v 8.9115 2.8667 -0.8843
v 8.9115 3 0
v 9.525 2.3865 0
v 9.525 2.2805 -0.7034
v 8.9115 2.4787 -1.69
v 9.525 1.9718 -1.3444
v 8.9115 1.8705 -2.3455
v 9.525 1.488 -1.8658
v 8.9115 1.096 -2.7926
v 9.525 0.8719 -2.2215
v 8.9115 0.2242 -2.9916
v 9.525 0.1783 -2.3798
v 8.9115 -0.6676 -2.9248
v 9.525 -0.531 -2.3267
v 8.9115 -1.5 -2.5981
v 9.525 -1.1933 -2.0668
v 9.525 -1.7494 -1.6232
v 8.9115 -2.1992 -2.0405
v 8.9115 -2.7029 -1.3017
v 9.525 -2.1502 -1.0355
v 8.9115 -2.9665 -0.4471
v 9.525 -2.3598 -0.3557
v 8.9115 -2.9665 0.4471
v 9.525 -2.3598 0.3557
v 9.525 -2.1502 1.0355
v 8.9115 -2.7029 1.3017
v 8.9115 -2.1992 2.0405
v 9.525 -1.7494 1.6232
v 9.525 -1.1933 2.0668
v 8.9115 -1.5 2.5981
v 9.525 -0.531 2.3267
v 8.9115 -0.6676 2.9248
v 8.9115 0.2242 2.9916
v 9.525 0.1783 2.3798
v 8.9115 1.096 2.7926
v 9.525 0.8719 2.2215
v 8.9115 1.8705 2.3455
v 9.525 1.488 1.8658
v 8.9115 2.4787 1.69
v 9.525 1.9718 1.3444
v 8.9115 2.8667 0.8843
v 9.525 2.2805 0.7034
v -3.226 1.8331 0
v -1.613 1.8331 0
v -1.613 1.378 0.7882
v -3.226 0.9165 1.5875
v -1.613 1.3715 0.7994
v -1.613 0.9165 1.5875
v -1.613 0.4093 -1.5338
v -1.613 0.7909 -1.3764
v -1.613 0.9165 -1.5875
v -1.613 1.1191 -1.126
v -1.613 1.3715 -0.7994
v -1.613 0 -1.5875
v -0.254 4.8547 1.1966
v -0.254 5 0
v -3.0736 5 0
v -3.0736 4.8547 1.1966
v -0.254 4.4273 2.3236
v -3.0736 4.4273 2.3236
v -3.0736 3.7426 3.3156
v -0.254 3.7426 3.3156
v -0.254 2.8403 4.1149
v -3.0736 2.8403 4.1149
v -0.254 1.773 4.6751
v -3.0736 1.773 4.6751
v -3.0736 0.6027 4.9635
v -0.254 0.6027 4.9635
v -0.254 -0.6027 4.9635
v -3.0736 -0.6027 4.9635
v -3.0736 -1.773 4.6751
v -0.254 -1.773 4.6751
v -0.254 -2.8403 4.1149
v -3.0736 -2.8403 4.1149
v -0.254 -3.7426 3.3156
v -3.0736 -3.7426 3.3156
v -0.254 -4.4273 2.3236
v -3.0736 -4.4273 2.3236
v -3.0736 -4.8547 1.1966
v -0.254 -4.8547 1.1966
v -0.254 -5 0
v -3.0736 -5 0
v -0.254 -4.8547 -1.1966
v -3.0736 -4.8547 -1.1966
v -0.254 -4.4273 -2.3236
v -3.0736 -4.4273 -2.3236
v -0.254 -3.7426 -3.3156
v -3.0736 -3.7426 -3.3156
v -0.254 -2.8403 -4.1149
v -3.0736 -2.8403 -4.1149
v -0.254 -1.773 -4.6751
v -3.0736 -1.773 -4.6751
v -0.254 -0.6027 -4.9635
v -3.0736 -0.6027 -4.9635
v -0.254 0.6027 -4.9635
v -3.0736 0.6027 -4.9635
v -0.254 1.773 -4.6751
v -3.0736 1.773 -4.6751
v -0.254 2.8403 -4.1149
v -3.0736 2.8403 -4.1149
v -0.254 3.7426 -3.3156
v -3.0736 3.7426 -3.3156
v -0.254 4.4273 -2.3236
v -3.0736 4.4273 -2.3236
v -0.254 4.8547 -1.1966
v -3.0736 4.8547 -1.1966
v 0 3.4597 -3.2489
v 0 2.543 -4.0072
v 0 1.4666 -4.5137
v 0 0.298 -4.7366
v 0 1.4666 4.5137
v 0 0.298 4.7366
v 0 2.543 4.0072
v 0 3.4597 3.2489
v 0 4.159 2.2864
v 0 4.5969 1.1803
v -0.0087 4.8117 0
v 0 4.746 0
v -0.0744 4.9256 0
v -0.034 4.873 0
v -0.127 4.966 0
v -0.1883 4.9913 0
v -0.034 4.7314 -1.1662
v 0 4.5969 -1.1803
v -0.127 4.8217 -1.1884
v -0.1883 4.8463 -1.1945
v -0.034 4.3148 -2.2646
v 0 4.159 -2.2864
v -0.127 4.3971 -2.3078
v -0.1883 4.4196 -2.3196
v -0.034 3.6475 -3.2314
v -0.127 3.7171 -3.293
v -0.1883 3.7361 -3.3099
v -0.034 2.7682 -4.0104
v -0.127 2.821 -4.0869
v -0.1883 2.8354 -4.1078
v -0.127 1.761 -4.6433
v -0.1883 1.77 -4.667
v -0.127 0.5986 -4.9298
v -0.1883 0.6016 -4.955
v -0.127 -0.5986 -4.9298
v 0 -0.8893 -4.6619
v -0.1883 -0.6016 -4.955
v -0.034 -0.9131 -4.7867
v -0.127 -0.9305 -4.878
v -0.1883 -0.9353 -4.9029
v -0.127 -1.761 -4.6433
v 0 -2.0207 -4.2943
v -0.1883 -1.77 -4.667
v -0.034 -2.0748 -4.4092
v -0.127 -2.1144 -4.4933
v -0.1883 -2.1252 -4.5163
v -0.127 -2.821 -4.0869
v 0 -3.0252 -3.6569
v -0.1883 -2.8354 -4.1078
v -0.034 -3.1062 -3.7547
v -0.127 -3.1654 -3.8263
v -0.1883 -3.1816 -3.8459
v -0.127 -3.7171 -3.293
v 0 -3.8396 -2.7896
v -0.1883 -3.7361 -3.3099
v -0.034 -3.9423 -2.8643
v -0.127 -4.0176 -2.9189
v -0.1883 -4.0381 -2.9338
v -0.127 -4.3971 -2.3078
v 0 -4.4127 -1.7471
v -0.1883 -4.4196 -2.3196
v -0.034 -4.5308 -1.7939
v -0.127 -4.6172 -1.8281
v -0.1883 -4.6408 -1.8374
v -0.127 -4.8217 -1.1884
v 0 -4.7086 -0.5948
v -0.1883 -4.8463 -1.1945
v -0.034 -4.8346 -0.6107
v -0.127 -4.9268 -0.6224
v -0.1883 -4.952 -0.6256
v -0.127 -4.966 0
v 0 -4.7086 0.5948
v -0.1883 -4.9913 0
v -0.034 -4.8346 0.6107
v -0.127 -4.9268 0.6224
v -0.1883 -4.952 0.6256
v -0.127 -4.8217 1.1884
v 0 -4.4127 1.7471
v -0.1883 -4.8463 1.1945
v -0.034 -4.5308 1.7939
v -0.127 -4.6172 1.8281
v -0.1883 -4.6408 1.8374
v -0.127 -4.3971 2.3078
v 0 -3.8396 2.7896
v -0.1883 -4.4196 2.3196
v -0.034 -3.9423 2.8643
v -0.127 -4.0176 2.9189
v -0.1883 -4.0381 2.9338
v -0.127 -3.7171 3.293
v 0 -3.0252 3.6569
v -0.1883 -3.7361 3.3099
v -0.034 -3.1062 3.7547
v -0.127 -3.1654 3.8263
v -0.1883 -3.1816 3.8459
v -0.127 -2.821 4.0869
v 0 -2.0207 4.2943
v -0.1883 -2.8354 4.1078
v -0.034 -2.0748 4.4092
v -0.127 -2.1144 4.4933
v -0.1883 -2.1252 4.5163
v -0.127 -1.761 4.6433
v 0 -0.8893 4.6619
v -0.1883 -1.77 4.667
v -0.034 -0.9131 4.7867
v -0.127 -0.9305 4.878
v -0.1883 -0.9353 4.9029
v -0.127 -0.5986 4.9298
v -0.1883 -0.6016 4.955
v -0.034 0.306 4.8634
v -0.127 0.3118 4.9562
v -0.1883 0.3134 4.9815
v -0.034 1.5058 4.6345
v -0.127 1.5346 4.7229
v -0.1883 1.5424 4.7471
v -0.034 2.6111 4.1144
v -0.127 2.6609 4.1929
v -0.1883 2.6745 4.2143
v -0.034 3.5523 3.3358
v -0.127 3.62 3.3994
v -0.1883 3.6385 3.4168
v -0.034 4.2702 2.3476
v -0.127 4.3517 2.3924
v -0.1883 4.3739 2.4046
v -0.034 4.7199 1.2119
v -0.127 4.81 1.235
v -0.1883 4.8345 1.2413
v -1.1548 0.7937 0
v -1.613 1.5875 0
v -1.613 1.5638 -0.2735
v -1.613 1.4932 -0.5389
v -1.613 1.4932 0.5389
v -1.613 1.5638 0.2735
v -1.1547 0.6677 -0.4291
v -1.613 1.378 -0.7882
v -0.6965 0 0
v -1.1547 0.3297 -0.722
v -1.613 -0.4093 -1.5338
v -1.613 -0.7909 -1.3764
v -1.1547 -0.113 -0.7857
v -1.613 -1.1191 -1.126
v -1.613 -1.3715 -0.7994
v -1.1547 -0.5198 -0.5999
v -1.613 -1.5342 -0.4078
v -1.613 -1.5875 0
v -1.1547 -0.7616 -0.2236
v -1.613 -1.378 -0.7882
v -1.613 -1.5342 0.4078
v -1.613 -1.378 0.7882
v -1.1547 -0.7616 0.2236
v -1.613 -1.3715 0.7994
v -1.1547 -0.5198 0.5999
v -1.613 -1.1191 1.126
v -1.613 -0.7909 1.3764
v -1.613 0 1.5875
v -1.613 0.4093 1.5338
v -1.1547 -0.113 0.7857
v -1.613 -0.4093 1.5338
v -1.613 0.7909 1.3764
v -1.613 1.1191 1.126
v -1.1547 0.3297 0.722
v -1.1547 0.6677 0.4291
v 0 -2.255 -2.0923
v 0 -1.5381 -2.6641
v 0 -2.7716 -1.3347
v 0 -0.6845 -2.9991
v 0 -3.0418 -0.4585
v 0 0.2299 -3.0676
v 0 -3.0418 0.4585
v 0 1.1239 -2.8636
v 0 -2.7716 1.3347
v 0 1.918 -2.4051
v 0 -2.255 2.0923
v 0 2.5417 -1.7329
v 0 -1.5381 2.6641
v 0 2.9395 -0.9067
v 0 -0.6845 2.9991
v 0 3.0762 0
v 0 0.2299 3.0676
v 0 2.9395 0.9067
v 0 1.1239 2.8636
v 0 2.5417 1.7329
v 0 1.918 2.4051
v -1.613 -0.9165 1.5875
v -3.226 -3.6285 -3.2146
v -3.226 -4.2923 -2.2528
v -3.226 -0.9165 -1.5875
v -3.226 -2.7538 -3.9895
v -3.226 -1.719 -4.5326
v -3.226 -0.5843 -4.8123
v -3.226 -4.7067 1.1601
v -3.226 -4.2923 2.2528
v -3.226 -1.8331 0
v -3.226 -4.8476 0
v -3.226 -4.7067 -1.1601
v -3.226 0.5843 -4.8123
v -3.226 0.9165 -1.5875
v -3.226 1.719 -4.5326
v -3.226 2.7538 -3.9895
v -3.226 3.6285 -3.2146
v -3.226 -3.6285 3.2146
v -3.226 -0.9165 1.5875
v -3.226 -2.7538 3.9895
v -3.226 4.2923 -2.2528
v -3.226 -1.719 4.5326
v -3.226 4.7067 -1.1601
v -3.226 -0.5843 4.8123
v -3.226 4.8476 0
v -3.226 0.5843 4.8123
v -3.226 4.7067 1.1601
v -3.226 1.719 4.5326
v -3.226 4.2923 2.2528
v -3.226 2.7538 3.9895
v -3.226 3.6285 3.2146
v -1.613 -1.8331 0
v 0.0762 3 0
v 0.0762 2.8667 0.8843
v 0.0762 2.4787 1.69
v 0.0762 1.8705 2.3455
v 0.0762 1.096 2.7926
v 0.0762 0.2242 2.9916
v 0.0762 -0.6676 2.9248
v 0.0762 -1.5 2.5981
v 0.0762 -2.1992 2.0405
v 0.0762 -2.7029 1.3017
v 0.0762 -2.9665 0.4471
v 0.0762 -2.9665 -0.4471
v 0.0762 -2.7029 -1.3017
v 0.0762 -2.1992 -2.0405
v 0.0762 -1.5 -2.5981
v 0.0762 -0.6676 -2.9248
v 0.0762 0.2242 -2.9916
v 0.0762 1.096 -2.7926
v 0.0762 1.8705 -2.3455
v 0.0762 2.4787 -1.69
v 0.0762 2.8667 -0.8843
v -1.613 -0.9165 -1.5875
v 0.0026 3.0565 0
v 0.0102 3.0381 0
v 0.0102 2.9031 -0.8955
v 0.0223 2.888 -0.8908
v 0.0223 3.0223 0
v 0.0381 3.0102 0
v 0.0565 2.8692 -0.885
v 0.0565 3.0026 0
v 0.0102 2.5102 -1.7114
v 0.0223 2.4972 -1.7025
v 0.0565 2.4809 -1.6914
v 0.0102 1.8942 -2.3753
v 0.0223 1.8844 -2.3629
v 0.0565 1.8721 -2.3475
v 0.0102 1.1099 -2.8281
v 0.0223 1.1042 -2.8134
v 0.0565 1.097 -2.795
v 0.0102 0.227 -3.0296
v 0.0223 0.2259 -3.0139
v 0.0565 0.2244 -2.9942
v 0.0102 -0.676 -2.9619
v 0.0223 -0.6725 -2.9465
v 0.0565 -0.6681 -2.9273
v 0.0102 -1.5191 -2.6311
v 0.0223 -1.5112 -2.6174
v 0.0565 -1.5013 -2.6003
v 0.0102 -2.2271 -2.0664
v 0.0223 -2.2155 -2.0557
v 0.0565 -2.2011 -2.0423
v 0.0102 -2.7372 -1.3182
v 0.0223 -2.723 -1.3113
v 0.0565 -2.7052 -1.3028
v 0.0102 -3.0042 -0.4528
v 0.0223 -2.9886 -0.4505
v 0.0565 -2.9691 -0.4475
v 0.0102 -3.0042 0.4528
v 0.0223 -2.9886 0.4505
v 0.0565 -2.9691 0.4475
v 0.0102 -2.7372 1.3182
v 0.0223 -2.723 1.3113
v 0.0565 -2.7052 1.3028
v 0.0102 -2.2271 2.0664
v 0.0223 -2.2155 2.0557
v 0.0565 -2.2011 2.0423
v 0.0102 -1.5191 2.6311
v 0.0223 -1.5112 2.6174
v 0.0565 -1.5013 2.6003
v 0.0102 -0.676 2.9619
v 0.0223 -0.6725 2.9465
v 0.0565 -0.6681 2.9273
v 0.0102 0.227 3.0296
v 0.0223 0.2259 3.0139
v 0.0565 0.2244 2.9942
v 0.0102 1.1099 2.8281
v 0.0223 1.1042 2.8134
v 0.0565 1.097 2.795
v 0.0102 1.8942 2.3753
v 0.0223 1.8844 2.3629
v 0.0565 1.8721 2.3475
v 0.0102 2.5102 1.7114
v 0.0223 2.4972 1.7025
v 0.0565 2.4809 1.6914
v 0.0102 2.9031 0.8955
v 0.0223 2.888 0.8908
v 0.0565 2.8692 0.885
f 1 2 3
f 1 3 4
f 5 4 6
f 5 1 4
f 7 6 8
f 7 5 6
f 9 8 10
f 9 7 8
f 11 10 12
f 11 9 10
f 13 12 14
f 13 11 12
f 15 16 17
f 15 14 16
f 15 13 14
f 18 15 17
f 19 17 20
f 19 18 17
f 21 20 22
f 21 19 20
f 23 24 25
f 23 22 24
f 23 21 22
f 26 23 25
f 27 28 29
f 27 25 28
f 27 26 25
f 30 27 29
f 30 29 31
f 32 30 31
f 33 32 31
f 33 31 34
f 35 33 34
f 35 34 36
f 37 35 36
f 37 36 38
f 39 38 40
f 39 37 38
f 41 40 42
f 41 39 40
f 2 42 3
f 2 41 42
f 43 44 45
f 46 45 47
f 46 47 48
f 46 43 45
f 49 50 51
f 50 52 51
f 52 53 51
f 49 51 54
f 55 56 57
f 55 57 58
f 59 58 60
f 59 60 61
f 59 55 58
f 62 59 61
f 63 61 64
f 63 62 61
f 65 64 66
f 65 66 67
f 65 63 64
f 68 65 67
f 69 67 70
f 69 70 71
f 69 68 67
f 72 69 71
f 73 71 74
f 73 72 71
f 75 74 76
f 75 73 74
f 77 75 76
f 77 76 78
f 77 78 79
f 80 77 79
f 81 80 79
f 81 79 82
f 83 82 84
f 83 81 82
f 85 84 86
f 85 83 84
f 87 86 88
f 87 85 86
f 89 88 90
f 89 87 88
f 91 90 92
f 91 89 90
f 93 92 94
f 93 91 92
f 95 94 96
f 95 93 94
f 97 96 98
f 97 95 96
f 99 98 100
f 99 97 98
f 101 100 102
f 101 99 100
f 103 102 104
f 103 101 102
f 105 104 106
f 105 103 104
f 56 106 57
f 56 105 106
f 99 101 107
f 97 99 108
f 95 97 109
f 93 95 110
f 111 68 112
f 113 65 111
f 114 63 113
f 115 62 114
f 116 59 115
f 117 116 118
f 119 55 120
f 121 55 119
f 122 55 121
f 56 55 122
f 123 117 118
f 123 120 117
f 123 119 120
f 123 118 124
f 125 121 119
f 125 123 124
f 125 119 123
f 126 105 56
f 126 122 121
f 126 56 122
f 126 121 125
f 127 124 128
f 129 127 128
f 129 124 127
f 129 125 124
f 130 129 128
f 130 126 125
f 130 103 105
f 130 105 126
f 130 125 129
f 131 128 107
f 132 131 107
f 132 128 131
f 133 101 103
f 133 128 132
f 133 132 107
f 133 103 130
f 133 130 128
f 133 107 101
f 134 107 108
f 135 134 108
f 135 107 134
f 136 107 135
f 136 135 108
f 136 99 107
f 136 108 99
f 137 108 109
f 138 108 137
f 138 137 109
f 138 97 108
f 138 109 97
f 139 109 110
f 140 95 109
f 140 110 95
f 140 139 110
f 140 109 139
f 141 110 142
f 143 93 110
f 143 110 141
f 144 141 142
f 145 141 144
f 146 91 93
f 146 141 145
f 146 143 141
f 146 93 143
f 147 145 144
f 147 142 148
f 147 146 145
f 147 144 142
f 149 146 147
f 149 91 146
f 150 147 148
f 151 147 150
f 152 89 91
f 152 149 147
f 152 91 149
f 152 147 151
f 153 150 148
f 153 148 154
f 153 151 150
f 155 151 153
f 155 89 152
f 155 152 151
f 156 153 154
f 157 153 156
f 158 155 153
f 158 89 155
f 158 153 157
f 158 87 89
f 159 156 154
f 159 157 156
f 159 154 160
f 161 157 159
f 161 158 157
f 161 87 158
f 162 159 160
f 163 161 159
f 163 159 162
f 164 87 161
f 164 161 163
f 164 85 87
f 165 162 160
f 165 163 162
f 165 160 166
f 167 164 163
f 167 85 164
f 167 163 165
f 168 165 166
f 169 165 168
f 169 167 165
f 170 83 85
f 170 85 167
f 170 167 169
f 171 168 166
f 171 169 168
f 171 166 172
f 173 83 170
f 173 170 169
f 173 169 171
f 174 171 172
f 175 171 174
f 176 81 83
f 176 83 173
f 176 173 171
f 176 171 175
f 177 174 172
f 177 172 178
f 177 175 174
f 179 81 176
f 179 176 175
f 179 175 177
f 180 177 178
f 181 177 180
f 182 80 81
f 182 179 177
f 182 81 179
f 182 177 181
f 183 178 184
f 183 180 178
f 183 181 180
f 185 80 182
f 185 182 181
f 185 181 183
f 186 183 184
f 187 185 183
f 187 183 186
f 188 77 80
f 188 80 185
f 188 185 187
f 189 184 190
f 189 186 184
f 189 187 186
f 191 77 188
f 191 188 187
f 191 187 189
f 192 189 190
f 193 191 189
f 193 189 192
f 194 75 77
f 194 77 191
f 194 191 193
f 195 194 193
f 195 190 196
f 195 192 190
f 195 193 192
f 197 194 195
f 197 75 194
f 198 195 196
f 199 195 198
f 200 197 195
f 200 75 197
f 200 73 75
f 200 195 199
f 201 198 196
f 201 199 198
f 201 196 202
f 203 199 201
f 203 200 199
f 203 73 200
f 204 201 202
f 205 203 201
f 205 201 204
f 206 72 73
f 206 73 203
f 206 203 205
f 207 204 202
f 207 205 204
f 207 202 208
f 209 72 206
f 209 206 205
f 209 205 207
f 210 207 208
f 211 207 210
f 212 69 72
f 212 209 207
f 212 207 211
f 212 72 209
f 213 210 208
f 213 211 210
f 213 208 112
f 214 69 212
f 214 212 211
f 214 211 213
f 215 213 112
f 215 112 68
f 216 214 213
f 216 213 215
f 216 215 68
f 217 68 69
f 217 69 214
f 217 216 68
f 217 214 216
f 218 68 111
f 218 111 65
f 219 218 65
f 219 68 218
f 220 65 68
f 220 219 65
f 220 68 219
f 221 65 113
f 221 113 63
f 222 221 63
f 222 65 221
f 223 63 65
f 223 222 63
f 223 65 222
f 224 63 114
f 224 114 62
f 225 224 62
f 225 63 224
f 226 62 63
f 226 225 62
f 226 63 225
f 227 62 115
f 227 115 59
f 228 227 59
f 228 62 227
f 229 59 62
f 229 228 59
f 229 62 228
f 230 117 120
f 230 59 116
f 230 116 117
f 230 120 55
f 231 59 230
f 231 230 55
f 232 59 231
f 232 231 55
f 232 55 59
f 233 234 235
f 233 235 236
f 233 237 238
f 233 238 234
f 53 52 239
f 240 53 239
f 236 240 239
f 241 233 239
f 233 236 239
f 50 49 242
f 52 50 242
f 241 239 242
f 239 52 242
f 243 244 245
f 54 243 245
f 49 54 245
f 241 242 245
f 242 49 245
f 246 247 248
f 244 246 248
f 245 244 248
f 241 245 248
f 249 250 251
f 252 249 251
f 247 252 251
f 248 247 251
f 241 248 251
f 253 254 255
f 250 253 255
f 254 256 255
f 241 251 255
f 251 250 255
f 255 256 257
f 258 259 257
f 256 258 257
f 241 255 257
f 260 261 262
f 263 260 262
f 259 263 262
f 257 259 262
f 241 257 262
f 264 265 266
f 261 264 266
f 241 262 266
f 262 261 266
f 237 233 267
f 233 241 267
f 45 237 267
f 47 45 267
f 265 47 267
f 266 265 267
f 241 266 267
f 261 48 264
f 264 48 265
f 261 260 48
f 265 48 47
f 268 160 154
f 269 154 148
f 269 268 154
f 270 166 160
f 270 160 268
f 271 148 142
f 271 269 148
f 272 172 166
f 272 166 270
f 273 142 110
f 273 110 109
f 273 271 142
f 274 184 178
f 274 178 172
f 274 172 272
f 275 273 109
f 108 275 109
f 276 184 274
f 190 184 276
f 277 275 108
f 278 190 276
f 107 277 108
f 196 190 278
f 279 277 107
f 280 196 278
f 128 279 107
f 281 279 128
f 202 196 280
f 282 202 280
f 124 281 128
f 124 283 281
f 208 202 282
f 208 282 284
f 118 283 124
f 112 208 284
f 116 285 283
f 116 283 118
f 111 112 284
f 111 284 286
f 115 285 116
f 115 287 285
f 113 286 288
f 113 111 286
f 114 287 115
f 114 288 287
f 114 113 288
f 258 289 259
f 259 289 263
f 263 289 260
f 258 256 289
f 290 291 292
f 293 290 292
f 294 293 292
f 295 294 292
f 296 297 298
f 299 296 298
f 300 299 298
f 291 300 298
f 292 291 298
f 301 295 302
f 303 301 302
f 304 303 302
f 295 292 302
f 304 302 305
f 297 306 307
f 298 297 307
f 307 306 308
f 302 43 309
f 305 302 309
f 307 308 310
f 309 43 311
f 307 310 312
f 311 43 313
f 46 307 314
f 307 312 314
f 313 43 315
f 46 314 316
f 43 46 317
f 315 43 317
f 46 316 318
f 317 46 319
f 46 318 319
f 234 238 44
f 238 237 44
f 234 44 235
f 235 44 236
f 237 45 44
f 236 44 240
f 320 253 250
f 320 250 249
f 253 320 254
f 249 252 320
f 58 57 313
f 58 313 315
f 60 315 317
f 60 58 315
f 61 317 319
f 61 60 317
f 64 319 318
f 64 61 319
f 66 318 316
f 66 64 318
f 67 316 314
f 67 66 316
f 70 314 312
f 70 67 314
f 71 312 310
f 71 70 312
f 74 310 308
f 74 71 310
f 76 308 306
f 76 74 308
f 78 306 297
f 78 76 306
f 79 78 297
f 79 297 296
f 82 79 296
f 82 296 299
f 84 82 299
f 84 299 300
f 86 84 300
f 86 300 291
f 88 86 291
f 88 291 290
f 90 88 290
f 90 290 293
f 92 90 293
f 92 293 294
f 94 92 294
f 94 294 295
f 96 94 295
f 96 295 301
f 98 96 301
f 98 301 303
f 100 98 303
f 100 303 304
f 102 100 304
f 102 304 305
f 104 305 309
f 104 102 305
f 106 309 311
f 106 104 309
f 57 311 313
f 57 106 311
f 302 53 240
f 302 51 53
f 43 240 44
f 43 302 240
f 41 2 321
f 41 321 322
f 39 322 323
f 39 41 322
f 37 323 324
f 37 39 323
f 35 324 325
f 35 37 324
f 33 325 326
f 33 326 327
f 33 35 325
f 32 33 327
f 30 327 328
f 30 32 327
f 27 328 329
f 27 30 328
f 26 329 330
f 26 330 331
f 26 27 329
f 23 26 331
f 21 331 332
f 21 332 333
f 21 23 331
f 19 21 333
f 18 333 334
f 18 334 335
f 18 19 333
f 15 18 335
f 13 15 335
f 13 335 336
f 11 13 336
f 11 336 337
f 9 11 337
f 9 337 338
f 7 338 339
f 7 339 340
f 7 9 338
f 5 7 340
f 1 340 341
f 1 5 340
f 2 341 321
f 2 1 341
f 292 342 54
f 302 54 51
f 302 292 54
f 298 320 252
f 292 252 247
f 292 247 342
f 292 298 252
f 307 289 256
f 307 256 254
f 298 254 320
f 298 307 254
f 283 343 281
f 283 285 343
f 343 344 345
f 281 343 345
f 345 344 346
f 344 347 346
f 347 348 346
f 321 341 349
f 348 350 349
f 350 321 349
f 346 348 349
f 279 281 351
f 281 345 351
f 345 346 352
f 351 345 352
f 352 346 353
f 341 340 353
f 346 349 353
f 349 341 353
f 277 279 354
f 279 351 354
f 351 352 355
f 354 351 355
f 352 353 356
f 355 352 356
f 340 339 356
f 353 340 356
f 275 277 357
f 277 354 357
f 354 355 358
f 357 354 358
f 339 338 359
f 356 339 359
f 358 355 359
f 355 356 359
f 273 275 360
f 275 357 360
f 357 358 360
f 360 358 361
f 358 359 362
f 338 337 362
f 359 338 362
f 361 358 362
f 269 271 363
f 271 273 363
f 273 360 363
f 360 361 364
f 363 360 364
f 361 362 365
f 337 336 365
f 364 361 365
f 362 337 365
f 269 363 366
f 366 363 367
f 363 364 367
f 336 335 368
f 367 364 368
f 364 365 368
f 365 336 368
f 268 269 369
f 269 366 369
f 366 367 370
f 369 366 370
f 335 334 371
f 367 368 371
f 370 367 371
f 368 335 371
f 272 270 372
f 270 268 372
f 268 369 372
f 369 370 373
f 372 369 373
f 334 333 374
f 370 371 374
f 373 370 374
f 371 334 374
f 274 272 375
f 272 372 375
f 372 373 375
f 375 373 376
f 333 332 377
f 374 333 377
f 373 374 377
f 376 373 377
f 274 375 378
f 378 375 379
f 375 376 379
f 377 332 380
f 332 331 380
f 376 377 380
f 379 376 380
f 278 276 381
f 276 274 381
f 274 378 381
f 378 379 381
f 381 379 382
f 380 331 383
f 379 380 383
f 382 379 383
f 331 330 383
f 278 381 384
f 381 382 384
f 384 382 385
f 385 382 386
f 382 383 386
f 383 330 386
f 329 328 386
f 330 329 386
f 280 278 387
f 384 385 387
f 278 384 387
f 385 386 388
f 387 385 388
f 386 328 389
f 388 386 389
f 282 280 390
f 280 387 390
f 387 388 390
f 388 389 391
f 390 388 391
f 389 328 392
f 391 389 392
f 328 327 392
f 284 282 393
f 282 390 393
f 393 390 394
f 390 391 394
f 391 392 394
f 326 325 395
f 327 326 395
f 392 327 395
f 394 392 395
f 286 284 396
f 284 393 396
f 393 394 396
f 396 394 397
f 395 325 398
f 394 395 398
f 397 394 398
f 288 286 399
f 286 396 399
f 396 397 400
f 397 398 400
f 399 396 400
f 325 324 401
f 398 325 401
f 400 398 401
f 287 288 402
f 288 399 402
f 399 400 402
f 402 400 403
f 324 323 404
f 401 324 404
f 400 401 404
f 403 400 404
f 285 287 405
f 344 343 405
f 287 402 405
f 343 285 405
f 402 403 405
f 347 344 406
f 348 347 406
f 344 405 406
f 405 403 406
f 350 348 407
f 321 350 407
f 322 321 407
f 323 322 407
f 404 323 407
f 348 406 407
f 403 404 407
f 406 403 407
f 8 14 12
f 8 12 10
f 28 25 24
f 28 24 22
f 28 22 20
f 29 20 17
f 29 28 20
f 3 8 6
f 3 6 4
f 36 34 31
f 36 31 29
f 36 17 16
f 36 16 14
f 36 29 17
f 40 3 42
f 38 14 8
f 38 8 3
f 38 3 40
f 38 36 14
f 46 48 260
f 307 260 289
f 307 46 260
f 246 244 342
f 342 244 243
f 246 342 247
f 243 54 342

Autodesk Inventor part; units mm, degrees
sketch "Sketch_1" plane through (0, 0, 0) normal (0, 0, 1) x (1, 0, 0)
  line L0 (9.525, 0) -> (-3.226, 0)
  line L1 (-3.226, 0) -> (-3.226, 4.8476)
  line L2 (-3.226, 4.8476) -> (-3.0736, 5)
  line L3 (-3.0736, 5) -> (-0.254, 5)
  arc A0 (0, 4.746) -> (-0.254, 5) centre (-0.254, 4.746) ccw
  line L4 (0, 4.746) -> (0, 3.0762)
  arc A1 (0, 3.0762) -> (0.0762, 3) centre (0.0762, 3.0762) ccw
  line L5 (0.0762, 3) -> (8.9115, 3)
  line L6 (8.9115, 3) -> (9.525, 2.3865)
  line L7 (9.525, 2.3865) -> (9.525, 0)
  line L8 (9.525, 0) -> (-3.226, 0)
revolve "Revolution1" add sketch "Sketch_1" angle 360 about axis through (9.525, 0, 0) along (1, 0, 0)
thread "Thread1" size "M6x1" class "6g" standard "ISO Metric profile" length 6.5302
sketch "Sketch_3" plane through (-3.226, 0, 0) normal (1, 0, 0) x (0, 0, -1)
  line L0 (-1.5875, -0.9165) -> (0, -1.8331)
  line L1 (0, -1.8331) -> (1.5875, -0.9165)
  line L2 (1.5875, -0.9165) -> (1.5875, 0.9165)
  line L3 (1.5875, 0.9165) -> (0, 1.8331)
  line L4 (0, 1.8331) -> (-1.5875, 0.9165)
  line L5 (-1.5875, 0.9165) -> (-1.5875, -0.9165)
extrude "Extrusion1" cut sketch "Sketch_3" along normal blind 1.613
sketch "Sketch_4" plane through (0, 0, 0) normal (0, 0, 1) x (1, 0, 0)
  line L0 (-0.6965, 0) -> (-1.613, 0)
  line L1 (-1.613, 0) -> (-1.613, 1.5875)
  line L2 (-1.613, 1.5875) -> (-0.6965, 0)
  line L3 (-0.6965, 0) -> (-1.613, 0)
revolve "Revolution2" cut sketch "Sketch_4" angle 360 about axis through (-0.6965, 0, 0) along (1, 0, 0)
ref_plane "screw_XY" through (0, 0, 0) normal (1, 0, 0) x (0, 0, -1)
ref_plane "screw_YZ" through (0, 0, 0) normal (0, 0, -1) x (0, 1, 0)
ref_plane "screw_ZX" through (0, 0, 0) normal (0, 1, 0) x (1, 0, 0)
ref_plane "screw1_XY" through (9.525, 0, 0) normal (1, 0, 0) x (0, 0, -1)
ref_plane "screw1_YZ" through (9.525, 0, 0) normal (0, 0, -1) x (0, 1, 0)
ref_plane "screw1_ZX" through (9.525, 0, 0) normal (0, 1, 0) x (1, 0, 0)
ref_plane "screw2_XY" through (9.325, 0, 0) normal (1, 0, 0) x (0, 0, -1)
ref_plane "screw2_YZ" through (9.325, 0, 0) normal (0, 0, -1) x (0, 1, 0)
ref_plane "screw2_ZX" through (9.325, 0, 0) normal (0, 1, 0) x (1, 0, 0)
ref_plane "to_tnut_XY" through (0.29, 0, 0) normal (1, 0, 0) x (0, 0, -1)
ref_plane "to_tnut_YZ" through (0.29, 0, 0) normal (0, 0, -1) x (0, 1, 0)
ref_plane "to_tnut_ZX" through (0.29, 0, 0) normal (0, 1, 0) x (1, 0, 0)
properties part number "25-2750-6"
